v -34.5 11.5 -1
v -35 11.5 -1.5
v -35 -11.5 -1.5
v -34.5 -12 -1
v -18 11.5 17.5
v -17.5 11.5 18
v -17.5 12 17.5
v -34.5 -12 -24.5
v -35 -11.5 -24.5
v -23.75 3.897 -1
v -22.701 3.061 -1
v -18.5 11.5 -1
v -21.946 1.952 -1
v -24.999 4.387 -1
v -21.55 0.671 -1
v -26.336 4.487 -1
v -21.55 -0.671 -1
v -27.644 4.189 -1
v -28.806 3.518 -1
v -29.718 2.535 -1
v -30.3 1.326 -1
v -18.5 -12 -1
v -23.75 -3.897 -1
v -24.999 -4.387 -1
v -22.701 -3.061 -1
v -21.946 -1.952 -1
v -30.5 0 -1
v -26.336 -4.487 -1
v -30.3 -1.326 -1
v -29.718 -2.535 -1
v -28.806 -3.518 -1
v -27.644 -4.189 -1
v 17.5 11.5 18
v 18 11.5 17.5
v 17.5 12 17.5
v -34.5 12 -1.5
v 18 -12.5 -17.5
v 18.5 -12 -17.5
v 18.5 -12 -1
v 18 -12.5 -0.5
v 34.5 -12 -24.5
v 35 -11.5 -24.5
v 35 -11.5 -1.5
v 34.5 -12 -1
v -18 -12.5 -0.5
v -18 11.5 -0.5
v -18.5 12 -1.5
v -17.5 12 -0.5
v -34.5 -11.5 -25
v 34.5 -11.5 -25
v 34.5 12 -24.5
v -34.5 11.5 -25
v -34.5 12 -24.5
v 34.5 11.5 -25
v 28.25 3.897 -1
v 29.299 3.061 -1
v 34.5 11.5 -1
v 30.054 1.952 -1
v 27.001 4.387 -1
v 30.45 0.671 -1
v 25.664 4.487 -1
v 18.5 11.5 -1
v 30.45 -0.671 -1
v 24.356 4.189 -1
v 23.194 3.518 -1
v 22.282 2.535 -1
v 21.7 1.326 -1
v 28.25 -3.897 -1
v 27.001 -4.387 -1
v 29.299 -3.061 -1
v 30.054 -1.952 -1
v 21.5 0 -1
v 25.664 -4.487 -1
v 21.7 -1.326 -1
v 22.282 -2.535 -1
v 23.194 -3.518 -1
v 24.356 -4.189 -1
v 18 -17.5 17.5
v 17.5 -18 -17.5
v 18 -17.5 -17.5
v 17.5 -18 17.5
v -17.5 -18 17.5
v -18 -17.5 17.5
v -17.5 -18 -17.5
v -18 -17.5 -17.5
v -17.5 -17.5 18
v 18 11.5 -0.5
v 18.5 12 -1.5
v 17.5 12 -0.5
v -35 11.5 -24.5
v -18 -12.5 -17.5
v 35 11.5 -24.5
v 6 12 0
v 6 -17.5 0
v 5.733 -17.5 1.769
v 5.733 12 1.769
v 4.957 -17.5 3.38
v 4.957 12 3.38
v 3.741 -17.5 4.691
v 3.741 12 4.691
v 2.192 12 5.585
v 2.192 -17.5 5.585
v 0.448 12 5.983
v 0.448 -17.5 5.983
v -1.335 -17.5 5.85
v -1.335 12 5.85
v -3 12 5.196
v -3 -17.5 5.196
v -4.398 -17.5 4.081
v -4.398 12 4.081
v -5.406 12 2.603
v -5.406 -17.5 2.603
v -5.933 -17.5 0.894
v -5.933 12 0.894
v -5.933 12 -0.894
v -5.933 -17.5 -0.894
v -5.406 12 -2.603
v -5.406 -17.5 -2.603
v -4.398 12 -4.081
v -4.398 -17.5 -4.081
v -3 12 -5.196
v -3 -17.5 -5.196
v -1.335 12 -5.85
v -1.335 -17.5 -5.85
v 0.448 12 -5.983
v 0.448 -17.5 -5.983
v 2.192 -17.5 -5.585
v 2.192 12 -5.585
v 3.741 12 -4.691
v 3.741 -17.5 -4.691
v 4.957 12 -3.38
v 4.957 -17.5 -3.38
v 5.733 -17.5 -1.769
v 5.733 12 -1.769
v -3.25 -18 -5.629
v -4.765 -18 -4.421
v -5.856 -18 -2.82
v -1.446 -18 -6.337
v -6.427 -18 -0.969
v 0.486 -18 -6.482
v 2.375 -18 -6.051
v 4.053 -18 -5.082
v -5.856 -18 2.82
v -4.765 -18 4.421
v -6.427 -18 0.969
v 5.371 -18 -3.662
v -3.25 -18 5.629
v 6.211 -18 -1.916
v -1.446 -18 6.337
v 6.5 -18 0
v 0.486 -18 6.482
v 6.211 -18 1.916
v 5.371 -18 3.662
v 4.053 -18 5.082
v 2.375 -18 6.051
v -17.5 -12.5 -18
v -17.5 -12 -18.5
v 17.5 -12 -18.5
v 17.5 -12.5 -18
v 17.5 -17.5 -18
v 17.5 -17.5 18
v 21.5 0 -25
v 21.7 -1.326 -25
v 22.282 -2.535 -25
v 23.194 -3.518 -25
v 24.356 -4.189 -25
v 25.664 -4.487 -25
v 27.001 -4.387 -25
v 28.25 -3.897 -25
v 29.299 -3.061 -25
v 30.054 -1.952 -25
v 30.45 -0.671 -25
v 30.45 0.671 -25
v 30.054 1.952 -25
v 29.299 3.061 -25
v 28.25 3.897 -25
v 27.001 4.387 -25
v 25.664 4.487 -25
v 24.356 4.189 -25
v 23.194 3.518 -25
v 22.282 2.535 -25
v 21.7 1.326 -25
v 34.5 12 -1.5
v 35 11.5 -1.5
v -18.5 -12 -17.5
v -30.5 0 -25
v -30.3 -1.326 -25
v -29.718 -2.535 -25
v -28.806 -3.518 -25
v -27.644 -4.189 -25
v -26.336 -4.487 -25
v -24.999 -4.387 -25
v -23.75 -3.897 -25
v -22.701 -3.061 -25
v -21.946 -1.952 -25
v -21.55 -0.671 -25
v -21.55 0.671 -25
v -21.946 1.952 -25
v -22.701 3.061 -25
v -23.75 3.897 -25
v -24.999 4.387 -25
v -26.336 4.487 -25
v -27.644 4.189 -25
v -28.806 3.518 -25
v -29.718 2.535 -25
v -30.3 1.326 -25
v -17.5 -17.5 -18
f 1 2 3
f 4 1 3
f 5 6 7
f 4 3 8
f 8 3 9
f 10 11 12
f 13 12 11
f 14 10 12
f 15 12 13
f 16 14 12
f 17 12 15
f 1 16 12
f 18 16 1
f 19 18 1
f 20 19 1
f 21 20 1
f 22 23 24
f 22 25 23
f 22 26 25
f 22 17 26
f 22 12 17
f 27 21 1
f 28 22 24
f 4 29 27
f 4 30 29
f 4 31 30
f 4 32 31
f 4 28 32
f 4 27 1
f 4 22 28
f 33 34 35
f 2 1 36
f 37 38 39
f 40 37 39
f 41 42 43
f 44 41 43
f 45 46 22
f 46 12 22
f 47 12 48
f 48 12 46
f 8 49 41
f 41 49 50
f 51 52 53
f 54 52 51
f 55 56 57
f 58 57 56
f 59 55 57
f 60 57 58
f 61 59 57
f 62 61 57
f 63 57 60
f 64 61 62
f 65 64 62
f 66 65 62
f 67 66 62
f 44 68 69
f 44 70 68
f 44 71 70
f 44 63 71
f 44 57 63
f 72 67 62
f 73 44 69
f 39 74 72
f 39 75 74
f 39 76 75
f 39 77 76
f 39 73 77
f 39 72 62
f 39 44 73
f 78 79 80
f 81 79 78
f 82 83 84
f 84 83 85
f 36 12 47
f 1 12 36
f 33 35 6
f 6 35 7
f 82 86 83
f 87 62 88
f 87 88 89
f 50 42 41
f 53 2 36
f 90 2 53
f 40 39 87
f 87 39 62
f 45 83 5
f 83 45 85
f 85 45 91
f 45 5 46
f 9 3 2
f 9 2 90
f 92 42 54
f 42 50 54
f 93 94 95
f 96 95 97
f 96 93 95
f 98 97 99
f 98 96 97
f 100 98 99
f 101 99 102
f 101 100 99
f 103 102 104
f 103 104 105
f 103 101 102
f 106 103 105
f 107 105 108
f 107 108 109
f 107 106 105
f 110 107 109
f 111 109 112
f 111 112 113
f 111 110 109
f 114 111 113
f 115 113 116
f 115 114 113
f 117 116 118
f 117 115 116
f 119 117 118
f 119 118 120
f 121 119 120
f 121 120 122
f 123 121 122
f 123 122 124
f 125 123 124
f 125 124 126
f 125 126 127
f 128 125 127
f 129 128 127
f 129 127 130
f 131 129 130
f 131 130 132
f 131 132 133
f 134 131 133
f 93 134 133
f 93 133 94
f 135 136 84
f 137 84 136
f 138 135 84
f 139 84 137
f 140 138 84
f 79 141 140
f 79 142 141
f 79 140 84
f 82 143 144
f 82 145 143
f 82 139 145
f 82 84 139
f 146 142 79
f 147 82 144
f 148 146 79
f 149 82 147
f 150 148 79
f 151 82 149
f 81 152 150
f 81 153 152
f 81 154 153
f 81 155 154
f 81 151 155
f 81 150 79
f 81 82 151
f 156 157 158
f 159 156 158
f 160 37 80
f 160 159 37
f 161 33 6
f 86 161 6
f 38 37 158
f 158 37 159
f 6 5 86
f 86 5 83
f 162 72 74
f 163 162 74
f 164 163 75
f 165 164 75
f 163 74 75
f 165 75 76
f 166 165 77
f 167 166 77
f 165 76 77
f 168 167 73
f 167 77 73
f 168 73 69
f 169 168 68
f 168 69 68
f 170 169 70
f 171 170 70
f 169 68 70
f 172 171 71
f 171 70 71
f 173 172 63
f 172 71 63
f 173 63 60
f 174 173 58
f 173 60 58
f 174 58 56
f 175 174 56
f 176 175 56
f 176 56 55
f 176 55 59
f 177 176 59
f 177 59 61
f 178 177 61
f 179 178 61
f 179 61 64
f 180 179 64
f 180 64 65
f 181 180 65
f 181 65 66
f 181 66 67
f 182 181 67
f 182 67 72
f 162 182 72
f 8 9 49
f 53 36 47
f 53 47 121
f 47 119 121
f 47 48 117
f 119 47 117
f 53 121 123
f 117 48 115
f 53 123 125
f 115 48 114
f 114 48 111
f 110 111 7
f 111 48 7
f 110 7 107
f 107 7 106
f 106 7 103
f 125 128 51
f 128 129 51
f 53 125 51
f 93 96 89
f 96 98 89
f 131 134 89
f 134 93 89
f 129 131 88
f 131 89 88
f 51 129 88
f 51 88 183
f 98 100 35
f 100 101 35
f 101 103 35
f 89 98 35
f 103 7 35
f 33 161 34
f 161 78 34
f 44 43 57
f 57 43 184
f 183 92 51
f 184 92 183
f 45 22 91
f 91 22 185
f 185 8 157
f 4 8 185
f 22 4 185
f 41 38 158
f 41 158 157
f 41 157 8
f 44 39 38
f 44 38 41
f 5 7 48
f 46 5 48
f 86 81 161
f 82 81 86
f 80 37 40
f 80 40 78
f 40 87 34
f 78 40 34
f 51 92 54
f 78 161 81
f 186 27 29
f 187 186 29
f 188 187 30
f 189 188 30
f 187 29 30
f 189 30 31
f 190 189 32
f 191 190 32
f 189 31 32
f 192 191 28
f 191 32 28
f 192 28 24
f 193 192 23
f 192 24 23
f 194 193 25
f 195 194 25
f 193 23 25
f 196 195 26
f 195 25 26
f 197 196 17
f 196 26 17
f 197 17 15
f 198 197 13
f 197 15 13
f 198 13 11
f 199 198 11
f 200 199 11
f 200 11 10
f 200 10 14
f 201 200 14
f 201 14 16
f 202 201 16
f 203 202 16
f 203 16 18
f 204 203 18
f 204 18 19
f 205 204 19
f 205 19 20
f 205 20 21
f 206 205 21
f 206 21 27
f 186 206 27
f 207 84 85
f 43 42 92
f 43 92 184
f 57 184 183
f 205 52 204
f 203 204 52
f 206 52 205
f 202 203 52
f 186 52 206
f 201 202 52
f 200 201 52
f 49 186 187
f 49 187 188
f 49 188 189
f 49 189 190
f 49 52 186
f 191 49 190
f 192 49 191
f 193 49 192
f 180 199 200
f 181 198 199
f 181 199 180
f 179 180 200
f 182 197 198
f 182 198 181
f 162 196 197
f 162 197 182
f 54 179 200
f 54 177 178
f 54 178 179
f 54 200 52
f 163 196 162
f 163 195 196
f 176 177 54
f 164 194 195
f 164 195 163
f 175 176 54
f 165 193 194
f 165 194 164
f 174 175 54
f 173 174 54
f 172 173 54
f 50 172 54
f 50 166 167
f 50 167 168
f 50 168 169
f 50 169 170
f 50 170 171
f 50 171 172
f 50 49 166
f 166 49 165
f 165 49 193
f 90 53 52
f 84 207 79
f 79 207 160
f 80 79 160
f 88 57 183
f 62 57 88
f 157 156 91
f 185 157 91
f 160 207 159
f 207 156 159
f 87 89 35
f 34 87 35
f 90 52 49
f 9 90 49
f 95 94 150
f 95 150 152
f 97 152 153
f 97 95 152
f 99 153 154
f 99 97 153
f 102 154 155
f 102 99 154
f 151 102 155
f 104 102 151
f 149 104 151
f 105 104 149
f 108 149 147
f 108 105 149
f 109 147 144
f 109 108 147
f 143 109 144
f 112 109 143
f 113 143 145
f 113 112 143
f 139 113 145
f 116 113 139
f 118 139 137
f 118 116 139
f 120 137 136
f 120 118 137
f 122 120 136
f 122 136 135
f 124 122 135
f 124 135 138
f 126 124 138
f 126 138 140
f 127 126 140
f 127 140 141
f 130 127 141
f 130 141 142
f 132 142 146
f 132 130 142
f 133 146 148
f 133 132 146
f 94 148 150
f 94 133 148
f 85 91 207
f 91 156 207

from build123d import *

# Parameters (mm, degrees)
F0_R     = 6
F1_DEPTH = 12
F2_R     = 6
F3_DEPTH = 6
F5_D     = 9
F6_SIZE  = 0.5


with BuildPart() as f1:
    # F0 (on Front) → F1 (new body, symmetric)
    with BuildSketch(Plane.XZ):
        Polygon((18, 18), (0, 18), (-18, 18), (-18, -1), (-35, -1), (-35, -25), (0, -25), (35, -25), (35, -1), (18, -1), align=None)
        Circle(F0_R, mode=Mode.SUBTRACT)
    extrude(amount=F1_DEPTH, both=True)

    # F2 (on face) → F3 (join)
    with BuildSketch(Plane.XZ.offset(12)):
        Polygon((18, 18), (-18, 18), (-18, -1), (-18, -18), (18, -18), (18, -1), align=None)
        Circle(F2_R, mode=Mode.SUBTRACT)
    extrude(amount=F3_DEPTH)

    # F5 (through all)
    with Locations(Plane(origin=(0, 0, -25), x_dir=(1, 0, 0), z_dir=(0, 0, -1))):
        with Locations((-26, 0), (26, 0)):
            Hole(F5_D / 2)

    # F6
    f6_edges = [f1.edges().sort_by_distance(p)[0] for p in [
        (18, -3, 18),
        (-18, -3, 18),
        (0, -18, 18),
        (-18, -18, 0),
        (0, -18, -18),
        (18, -18, 0),
        (-6, -18, 0),
        (35, 0, -25),
        (35, 12, -13),
        (35, 0, -1),
        (35, -12, -13),
        (26.5, 12, -1),
        (18, 12, 8.5),
        (0, 12, 18),
        (-26.5, 12, -1),
        (-18, 12, 8.5),
        (-18, 0, -1),
        (-18, -12, -9.5),
        (-18, -15, -18),
        (18, -15, -18),
        (18, -12, -9.5),
        (18, 0, -1),
        (0, 12, -25),
        (-35, 0, -1),
        (-35, 12, -13),
        (-35, 0, -25),
        (-35, -12, -13),
        (0, -12, -25),
        (0, -12, -18),
    ]]
    chamfer(f6_edges, length=F6_SIZE)


solid = f1.part
